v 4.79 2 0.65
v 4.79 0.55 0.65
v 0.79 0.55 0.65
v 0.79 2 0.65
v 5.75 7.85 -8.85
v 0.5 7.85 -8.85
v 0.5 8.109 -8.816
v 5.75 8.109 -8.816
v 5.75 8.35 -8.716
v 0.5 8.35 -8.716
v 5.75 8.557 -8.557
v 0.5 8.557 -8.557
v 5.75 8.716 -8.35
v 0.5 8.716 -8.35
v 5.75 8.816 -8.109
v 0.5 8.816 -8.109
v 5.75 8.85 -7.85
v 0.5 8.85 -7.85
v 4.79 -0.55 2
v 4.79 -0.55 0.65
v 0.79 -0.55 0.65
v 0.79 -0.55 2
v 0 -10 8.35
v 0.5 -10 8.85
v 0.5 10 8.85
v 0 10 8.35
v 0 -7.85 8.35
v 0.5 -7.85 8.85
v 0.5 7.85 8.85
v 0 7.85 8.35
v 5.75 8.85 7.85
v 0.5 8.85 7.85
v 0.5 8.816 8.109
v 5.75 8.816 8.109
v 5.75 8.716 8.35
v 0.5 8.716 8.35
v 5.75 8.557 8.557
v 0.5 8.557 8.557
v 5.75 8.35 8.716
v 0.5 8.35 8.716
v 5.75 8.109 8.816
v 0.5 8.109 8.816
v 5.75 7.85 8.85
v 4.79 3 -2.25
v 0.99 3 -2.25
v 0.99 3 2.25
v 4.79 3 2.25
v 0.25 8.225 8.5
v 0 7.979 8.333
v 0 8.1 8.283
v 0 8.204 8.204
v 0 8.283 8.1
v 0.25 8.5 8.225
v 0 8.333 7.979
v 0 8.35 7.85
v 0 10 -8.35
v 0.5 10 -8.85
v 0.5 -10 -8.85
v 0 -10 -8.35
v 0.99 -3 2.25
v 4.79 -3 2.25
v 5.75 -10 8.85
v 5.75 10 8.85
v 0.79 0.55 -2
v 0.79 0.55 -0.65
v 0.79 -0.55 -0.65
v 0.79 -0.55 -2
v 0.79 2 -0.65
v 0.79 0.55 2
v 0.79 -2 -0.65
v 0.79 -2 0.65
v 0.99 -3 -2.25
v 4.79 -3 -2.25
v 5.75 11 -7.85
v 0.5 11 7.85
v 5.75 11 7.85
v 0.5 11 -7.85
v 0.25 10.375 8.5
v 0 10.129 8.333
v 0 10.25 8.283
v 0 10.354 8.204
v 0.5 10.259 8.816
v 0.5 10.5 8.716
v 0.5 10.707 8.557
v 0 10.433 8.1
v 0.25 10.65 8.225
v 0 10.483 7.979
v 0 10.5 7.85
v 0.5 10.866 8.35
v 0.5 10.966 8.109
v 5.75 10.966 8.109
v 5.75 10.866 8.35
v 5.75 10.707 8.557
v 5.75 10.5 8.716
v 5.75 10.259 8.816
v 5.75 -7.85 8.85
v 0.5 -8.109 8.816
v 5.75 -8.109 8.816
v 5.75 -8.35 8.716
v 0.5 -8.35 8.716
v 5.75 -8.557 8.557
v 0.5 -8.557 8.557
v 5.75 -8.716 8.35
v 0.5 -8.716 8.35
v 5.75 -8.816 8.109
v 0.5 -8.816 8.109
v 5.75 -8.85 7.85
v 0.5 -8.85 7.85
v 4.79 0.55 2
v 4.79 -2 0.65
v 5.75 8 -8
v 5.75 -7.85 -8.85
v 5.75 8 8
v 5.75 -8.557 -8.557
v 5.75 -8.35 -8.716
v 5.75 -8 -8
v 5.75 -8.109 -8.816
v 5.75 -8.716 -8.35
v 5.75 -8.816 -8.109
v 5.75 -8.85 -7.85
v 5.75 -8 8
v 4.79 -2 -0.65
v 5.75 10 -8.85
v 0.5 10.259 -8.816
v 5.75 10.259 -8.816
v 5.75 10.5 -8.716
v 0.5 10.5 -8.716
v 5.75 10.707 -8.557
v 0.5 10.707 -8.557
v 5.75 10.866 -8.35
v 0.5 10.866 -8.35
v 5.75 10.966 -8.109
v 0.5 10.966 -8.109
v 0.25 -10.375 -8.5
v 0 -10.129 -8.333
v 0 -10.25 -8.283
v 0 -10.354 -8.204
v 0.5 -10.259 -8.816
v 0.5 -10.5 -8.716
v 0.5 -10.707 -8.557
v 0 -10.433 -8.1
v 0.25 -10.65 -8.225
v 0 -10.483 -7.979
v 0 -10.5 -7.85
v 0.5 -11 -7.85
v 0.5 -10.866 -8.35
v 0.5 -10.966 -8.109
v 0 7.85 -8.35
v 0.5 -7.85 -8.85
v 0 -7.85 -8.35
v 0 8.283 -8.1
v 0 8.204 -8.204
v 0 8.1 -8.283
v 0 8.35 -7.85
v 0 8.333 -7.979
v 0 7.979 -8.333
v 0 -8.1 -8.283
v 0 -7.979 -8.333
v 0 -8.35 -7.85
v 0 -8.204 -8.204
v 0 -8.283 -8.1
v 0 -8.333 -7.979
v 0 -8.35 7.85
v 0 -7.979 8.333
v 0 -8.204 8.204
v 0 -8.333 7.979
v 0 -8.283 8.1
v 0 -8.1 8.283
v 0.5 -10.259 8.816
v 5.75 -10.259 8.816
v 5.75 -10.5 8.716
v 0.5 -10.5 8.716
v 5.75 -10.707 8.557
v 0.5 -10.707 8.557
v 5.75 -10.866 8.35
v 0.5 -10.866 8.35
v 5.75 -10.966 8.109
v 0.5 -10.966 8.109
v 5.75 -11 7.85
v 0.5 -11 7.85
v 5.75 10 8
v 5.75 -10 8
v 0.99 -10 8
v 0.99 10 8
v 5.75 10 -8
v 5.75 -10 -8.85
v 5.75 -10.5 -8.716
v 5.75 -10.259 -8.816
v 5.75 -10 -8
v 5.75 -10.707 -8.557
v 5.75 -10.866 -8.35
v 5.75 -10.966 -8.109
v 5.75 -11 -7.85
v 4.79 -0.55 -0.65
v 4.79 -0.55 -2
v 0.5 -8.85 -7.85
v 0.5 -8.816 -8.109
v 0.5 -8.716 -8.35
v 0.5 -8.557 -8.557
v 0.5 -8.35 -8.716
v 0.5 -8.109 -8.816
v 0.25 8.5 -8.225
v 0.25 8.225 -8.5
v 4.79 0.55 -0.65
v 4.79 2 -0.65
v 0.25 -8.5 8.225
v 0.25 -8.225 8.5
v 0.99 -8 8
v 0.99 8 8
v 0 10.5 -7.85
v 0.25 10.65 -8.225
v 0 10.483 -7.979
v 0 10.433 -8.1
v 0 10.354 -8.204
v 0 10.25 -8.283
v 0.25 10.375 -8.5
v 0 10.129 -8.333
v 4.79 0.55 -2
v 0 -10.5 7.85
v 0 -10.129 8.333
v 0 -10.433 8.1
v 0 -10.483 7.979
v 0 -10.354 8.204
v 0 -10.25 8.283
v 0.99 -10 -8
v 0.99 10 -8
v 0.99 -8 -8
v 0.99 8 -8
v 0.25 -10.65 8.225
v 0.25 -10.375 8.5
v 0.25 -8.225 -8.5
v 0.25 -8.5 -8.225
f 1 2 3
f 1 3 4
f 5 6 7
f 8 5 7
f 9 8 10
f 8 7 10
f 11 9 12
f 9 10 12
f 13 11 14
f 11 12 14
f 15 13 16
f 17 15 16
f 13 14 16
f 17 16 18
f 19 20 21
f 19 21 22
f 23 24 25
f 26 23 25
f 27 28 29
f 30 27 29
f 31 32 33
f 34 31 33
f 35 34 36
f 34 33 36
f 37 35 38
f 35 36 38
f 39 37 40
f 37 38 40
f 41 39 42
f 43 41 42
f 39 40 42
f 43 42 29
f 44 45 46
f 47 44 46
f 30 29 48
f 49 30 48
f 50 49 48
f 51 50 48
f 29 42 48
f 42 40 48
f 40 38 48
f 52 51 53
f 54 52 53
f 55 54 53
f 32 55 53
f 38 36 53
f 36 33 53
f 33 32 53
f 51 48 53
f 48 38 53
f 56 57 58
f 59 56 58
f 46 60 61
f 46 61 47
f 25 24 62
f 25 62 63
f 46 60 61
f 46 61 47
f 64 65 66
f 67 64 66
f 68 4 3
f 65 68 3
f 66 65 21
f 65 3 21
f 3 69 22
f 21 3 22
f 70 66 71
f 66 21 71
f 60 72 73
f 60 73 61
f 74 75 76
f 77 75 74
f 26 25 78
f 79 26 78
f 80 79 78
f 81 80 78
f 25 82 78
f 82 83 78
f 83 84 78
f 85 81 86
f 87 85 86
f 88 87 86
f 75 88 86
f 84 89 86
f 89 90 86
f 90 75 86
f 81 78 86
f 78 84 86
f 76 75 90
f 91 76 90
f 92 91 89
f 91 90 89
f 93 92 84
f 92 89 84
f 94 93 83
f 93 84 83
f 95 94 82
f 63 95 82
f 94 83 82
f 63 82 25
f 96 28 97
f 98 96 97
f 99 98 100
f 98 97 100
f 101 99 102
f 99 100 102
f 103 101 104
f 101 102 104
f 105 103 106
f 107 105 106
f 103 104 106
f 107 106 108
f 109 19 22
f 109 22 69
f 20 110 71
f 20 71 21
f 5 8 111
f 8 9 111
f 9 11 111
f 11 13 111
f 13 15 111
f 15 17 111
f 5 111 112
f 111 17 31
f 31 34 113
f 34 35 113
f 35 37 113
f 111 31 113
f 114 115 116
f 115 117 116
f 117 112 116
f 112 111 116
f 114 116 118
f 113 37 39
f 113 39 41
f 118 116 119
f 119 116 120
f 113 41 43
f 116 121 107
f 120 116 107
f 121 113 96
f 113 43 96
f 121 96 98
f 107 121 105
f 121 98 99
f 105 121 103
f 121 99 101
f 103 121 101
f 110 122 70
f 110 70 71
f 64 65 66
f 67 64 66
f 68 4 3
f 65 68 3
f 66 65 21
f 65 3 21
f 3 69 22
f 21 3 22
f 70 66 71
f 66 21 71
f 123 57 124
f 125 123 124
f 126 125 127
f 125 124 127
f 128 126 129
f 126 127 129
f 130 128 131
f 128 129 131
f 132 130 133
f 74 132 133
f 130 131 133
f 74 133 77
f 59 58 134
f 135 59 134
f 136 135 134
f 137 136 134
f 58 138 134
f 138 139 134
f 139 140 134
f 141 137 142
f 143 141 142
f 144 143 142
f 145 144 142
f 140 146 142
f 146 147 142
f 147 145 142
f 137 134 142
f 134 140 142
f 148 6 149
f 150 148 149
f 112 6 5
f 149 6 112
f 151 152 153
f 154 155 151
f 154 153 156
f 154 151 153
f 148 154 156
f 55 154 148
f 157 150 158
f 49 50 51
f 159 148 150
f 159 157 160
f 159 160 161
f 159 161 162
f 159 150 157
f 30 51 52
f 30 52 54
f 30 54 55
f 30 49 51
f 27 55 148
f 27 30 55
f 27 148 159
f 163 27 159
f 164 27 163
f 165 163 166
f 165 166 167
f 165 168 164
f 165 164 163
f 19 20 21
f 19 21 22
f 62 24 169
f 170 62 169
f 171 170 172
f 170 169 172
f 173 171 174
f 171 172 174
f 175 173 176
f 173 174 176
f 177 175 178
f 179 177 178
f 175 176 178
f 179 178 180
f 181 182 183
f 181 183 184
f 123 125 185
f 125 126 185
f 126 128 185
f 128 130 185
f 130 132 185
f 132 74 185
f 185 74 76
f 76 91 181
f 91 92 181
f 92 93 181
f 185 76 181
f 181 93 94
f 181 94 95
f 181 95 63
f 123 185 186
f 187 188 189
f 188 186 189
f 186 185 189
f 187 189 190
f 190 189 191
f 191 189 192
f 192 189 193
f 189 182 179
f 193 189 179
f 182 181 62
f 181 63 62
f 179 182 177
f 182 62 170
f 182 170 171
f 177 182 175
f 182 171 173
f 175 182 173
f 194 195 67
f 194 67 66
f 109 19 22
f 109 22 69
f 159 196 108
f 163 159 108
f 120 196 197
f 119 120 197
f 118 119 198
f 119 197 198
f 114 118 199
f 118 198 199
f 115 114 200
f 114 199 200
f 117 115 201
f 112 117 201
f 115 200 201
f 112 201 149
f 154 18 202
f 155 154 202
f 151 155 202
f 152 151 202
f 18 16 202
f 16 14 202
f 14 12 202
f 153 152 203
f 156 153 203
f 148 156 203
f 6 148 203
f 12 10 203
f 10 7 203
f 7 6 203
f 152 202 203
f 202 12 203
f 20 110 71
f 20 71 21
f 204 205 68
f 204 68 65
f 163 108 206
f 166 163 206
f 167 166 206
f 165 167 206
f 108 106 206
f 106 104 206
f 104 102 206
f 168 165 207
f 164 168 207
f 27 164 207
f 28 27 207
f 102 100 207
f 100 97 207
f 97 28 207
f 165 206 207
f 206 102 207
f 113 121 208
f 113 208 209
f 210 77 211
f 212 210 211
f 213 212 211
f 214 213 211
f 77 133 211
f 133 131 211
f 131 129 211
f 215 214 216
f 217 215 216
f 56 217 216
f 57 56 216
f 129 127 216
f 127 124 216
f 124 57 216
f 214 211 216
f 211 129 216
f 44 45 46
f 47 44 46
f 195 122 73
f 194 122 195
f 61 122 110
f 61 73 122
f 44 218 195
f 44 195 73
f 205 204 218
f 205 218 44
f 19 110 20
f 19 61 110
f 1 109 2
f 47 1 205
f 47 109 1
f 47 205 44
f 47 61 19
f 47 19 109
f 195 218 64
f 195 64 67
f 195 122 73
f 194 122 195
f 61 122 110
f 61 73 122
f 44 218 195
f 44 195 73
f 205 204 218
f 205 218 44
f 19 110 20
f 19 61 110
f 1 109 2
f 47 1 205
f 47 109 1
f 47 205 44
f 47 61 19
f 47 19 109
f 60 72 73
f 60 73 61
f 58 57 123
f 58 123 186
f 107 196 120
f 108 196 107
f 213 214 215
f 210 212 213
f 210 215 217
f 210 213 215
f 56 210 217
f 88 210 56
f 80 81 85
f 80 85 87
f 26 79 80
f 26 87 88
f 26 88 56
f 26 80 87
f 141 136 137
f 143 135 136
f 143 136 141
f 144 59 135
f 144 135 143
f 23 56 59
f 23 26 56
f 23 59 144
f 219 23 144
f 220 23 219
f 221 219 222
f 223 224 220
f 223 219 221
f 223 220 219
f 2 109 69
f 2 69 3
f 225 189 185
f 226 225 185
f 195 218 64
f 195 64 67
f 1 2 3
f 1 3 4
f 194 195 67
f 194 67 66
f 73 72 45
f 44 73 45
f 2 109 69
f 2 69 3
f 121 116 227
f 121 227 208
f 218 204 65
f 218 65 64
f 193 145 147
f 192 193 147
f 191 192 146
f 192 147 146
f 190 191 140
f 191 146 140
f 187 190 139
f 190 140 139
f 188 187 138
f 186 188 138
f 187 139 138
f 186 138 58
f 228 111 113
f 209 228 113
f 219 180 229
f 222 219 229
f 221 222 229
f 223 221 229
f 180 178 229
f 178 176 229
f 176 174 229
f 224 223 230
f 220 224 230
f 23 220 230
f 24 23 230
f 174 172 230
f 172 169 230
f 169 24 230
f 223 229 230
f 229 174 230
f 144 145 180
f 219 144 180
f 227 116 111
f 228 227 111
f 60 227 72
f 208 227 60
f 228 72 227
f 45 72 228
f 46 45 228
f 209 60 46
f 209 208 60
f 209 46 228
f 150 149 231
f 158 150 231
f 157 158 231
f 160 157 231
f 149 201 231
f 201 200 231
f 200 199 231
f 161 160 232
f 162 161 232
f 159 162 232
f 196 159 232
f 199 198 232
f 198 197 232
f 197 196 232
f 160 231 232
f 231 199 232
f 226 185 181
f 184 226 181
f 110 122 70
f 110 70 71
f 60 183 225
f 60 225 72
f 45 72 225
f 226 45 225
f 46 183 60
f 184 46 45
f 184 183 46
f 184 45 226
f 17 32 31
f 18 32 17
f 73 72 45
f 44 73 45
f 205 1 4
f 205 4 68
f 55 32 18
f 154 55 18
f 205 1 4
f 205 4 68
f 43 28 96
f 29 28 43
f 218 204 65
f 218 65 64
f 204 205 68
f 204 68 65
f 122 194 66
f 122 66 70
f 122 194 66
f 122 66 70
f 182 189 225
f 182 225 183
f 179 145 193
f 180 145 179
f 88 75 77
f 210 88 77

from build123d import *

# Parameters (mm, degrees)
PAD_DEPTH       = 5.75
SKETCH001_W     = 16
SKETCH001_H     = 16
POCKET_DEPTH    = 4.76
CHAMFER_SIZE    = 0.5
SKETCH002_W     = 6
SKETCH002_H     = 4.5
PAD001_DEPTH    = 3.8
POCKET001_DEPTH = 4
PAD002_DEPTH    = 5.75
SKETCH005_W     = 20
SKETCH005_H     = 16
POCKET002_DEPTH = 4.76
CHAMFER001_SIZE = 0.5
SKETCH006_W     = 6
SKETCH006_H     = 4.5
PAD003_DEPTH    = 3.8
POCKET003_DEPTH = 4


with BuildPart() as f_1_u:
    # Sketch → Pad (new body)
    with BuildSketch(Plane.YZ):
        with BuildLine():
            Line((-7.85, 8.85), (7.85, 8.85))
            ThreePointArc((8.85, 7.85), (8.557107, 8.557107), (7.85, 8.85))
            Line((8.85, 7.85), (8.85, -7.85))
            ThreePointArc((7.85, -8.85), (8.557107, -8.557107), (8.85, -7.85))
            Line((7.85, -8.85), (-7.85, -8.85))
            ThreePointArc((-8.85, -7.85), (-8.557107, -8.557107), (-7.85, -8.85))
            Line((-8.85, -7.85), (-8.85, 7.85))
            ThreePointArc((-7.85, 8.85), (-8.557107, 8.557107), (-8.85, 7.85))
        make_face()
    extrude(amount=PAD_DEPTH)

    # Sketch001 (on Face10 of Pad) → Pocket (cut)
    with BuildSketch(Plane.YZ.offset(5.75)):
        Rectangle(SKETCH001_W, SKETCH001_H)
    extrude(amount=-POCKET_DEPTH, mode=Mode.SUBTRACT)

    # Chamfer
    chamfer_edges = [f_1_u.edges().sort_by_distance(p)[0] for p in [
        (0, -8.85, 0),
        (0, -8.557107, 8.557107),
        (0, 0, 8.85),
        (0, 8.557107, 8.557107),
        (0, 8.85, 0),
        (0, 8.557107, -8.557107),
        (0, 0, -8.85),
        (0, -8.557107, -8.557107),
    ]]
    chamfer(chamfer_edges, length=CHAMFER_SIZE)

    # Sketch002 (on Face23 of Chamfer) → Pad001 (join)
    with BuildSketch(Plane.YZ.offset(0.99)):
        Rectangle(SKETCH002_W, SKETCH002_H)
    extrude(amount=PAD001_DEPTH)

    # Sketch003 (on Face28 of Pad001) → Pocket001 (cut)
    with BuildSketch(Plane.YZ.offset(4.79)):
        Polygon((-0.55, 2), (0.55, 2), (0.55, 0.65), (2, 0.65), (2, -0.65), (0.55, -0.65), (0.55, -2), (-0.55, -2), (-0.55, -0.65), (-2, -0.65), (-2, 0.65), (-0.55, 0.65), align=None)
    extrude(amount=-POCKET001_DEPTH, mode=Mode.SUBTRACT)


with BuildPart() as f_1_5_u:
    # Sketch004 → Pad002 (new body)
    with BuildSketch(Plane.YZ):
        with BuildLine():
            Line((-10, 8.85), (10, 8.85))
            ThreePointArc((11, 7.85), (10.707107, 8.557107), (10, 8.85))
            Line((11, 7.85), (11, -7.85))
            ThreePointArc((10, -8.85), (10.707107, -8.557107), (11, -7.85))
            Line((10, -8.85), (-10, -8.85))
            ThreePointArc((-11, -7.85), (-10.707107, -8.557107), (-10, -8.85))
            Line((-11, -7.85), (-11, 7.85))
            ThreePointArc((-10, 8.85), (-10.707107, 8.557107), (-11, 7.85))
        make_face()
    extrude(amount=PAD002_DEPTH)

    # Sketch005 (on Face10 of Pad002) → Pocket002 (cut)
    with BuildSketch(Plane.YZ.offset(5.75)):
        Rectangle(SKETCH005_W, SKETCH005_H)
    extrude(amount=-POCKET002_DEPTH, mode=Mode.SUBTRACT)

    # Chamfer001
    chamfer001_edges = [f_1_5_u.edges().sort_by_distance(p)[0] for p in [
        (0, -11, 0),
        (0, -10.707107, 8.557107),
        (0, 0, 8.85),
        (0, 10.707107, 8.557107),
        (0, 11, 0),
        (0, 10.707107, -8.557107),
        (0, 0, -8.85),
        (0, -10.707107, -8.557107),
    ]]
    chamfer(chamfer001_edges, length=CHAMFER001_SIZE)

    # Sketch006 (on Face23 of Chamfer001) → Pad003 (join)
    with BuildSketch(Plane.YZ.offset(0.99)):
        Rectangle(SKETCH006_W, SKETCH006_H)
    extrude(amount=PAD003_DEPTH)

    # Sketch007 (on Face28 of Pad003) → Pocket003 (cut)
    with BuildSketch(Plane.YZ.offset(4.79)):
        Polygon((-0.55, 2), (0.55, 2), (0.55, 0.65), (2, 0.65), (2, -0.65), (0.55, -0.65), (0.55, -2), (-0.55, -2), (-0.55, -0.65), (-2, -0.65), (-2, 0.65), (-0.55, 0.65), align=None)
    extrude(amount=-POCKET003_DEPTH, mode=Mode.SUBTRACT)


solid = Compound([f_1_u.part, f_1_5_u.part])
